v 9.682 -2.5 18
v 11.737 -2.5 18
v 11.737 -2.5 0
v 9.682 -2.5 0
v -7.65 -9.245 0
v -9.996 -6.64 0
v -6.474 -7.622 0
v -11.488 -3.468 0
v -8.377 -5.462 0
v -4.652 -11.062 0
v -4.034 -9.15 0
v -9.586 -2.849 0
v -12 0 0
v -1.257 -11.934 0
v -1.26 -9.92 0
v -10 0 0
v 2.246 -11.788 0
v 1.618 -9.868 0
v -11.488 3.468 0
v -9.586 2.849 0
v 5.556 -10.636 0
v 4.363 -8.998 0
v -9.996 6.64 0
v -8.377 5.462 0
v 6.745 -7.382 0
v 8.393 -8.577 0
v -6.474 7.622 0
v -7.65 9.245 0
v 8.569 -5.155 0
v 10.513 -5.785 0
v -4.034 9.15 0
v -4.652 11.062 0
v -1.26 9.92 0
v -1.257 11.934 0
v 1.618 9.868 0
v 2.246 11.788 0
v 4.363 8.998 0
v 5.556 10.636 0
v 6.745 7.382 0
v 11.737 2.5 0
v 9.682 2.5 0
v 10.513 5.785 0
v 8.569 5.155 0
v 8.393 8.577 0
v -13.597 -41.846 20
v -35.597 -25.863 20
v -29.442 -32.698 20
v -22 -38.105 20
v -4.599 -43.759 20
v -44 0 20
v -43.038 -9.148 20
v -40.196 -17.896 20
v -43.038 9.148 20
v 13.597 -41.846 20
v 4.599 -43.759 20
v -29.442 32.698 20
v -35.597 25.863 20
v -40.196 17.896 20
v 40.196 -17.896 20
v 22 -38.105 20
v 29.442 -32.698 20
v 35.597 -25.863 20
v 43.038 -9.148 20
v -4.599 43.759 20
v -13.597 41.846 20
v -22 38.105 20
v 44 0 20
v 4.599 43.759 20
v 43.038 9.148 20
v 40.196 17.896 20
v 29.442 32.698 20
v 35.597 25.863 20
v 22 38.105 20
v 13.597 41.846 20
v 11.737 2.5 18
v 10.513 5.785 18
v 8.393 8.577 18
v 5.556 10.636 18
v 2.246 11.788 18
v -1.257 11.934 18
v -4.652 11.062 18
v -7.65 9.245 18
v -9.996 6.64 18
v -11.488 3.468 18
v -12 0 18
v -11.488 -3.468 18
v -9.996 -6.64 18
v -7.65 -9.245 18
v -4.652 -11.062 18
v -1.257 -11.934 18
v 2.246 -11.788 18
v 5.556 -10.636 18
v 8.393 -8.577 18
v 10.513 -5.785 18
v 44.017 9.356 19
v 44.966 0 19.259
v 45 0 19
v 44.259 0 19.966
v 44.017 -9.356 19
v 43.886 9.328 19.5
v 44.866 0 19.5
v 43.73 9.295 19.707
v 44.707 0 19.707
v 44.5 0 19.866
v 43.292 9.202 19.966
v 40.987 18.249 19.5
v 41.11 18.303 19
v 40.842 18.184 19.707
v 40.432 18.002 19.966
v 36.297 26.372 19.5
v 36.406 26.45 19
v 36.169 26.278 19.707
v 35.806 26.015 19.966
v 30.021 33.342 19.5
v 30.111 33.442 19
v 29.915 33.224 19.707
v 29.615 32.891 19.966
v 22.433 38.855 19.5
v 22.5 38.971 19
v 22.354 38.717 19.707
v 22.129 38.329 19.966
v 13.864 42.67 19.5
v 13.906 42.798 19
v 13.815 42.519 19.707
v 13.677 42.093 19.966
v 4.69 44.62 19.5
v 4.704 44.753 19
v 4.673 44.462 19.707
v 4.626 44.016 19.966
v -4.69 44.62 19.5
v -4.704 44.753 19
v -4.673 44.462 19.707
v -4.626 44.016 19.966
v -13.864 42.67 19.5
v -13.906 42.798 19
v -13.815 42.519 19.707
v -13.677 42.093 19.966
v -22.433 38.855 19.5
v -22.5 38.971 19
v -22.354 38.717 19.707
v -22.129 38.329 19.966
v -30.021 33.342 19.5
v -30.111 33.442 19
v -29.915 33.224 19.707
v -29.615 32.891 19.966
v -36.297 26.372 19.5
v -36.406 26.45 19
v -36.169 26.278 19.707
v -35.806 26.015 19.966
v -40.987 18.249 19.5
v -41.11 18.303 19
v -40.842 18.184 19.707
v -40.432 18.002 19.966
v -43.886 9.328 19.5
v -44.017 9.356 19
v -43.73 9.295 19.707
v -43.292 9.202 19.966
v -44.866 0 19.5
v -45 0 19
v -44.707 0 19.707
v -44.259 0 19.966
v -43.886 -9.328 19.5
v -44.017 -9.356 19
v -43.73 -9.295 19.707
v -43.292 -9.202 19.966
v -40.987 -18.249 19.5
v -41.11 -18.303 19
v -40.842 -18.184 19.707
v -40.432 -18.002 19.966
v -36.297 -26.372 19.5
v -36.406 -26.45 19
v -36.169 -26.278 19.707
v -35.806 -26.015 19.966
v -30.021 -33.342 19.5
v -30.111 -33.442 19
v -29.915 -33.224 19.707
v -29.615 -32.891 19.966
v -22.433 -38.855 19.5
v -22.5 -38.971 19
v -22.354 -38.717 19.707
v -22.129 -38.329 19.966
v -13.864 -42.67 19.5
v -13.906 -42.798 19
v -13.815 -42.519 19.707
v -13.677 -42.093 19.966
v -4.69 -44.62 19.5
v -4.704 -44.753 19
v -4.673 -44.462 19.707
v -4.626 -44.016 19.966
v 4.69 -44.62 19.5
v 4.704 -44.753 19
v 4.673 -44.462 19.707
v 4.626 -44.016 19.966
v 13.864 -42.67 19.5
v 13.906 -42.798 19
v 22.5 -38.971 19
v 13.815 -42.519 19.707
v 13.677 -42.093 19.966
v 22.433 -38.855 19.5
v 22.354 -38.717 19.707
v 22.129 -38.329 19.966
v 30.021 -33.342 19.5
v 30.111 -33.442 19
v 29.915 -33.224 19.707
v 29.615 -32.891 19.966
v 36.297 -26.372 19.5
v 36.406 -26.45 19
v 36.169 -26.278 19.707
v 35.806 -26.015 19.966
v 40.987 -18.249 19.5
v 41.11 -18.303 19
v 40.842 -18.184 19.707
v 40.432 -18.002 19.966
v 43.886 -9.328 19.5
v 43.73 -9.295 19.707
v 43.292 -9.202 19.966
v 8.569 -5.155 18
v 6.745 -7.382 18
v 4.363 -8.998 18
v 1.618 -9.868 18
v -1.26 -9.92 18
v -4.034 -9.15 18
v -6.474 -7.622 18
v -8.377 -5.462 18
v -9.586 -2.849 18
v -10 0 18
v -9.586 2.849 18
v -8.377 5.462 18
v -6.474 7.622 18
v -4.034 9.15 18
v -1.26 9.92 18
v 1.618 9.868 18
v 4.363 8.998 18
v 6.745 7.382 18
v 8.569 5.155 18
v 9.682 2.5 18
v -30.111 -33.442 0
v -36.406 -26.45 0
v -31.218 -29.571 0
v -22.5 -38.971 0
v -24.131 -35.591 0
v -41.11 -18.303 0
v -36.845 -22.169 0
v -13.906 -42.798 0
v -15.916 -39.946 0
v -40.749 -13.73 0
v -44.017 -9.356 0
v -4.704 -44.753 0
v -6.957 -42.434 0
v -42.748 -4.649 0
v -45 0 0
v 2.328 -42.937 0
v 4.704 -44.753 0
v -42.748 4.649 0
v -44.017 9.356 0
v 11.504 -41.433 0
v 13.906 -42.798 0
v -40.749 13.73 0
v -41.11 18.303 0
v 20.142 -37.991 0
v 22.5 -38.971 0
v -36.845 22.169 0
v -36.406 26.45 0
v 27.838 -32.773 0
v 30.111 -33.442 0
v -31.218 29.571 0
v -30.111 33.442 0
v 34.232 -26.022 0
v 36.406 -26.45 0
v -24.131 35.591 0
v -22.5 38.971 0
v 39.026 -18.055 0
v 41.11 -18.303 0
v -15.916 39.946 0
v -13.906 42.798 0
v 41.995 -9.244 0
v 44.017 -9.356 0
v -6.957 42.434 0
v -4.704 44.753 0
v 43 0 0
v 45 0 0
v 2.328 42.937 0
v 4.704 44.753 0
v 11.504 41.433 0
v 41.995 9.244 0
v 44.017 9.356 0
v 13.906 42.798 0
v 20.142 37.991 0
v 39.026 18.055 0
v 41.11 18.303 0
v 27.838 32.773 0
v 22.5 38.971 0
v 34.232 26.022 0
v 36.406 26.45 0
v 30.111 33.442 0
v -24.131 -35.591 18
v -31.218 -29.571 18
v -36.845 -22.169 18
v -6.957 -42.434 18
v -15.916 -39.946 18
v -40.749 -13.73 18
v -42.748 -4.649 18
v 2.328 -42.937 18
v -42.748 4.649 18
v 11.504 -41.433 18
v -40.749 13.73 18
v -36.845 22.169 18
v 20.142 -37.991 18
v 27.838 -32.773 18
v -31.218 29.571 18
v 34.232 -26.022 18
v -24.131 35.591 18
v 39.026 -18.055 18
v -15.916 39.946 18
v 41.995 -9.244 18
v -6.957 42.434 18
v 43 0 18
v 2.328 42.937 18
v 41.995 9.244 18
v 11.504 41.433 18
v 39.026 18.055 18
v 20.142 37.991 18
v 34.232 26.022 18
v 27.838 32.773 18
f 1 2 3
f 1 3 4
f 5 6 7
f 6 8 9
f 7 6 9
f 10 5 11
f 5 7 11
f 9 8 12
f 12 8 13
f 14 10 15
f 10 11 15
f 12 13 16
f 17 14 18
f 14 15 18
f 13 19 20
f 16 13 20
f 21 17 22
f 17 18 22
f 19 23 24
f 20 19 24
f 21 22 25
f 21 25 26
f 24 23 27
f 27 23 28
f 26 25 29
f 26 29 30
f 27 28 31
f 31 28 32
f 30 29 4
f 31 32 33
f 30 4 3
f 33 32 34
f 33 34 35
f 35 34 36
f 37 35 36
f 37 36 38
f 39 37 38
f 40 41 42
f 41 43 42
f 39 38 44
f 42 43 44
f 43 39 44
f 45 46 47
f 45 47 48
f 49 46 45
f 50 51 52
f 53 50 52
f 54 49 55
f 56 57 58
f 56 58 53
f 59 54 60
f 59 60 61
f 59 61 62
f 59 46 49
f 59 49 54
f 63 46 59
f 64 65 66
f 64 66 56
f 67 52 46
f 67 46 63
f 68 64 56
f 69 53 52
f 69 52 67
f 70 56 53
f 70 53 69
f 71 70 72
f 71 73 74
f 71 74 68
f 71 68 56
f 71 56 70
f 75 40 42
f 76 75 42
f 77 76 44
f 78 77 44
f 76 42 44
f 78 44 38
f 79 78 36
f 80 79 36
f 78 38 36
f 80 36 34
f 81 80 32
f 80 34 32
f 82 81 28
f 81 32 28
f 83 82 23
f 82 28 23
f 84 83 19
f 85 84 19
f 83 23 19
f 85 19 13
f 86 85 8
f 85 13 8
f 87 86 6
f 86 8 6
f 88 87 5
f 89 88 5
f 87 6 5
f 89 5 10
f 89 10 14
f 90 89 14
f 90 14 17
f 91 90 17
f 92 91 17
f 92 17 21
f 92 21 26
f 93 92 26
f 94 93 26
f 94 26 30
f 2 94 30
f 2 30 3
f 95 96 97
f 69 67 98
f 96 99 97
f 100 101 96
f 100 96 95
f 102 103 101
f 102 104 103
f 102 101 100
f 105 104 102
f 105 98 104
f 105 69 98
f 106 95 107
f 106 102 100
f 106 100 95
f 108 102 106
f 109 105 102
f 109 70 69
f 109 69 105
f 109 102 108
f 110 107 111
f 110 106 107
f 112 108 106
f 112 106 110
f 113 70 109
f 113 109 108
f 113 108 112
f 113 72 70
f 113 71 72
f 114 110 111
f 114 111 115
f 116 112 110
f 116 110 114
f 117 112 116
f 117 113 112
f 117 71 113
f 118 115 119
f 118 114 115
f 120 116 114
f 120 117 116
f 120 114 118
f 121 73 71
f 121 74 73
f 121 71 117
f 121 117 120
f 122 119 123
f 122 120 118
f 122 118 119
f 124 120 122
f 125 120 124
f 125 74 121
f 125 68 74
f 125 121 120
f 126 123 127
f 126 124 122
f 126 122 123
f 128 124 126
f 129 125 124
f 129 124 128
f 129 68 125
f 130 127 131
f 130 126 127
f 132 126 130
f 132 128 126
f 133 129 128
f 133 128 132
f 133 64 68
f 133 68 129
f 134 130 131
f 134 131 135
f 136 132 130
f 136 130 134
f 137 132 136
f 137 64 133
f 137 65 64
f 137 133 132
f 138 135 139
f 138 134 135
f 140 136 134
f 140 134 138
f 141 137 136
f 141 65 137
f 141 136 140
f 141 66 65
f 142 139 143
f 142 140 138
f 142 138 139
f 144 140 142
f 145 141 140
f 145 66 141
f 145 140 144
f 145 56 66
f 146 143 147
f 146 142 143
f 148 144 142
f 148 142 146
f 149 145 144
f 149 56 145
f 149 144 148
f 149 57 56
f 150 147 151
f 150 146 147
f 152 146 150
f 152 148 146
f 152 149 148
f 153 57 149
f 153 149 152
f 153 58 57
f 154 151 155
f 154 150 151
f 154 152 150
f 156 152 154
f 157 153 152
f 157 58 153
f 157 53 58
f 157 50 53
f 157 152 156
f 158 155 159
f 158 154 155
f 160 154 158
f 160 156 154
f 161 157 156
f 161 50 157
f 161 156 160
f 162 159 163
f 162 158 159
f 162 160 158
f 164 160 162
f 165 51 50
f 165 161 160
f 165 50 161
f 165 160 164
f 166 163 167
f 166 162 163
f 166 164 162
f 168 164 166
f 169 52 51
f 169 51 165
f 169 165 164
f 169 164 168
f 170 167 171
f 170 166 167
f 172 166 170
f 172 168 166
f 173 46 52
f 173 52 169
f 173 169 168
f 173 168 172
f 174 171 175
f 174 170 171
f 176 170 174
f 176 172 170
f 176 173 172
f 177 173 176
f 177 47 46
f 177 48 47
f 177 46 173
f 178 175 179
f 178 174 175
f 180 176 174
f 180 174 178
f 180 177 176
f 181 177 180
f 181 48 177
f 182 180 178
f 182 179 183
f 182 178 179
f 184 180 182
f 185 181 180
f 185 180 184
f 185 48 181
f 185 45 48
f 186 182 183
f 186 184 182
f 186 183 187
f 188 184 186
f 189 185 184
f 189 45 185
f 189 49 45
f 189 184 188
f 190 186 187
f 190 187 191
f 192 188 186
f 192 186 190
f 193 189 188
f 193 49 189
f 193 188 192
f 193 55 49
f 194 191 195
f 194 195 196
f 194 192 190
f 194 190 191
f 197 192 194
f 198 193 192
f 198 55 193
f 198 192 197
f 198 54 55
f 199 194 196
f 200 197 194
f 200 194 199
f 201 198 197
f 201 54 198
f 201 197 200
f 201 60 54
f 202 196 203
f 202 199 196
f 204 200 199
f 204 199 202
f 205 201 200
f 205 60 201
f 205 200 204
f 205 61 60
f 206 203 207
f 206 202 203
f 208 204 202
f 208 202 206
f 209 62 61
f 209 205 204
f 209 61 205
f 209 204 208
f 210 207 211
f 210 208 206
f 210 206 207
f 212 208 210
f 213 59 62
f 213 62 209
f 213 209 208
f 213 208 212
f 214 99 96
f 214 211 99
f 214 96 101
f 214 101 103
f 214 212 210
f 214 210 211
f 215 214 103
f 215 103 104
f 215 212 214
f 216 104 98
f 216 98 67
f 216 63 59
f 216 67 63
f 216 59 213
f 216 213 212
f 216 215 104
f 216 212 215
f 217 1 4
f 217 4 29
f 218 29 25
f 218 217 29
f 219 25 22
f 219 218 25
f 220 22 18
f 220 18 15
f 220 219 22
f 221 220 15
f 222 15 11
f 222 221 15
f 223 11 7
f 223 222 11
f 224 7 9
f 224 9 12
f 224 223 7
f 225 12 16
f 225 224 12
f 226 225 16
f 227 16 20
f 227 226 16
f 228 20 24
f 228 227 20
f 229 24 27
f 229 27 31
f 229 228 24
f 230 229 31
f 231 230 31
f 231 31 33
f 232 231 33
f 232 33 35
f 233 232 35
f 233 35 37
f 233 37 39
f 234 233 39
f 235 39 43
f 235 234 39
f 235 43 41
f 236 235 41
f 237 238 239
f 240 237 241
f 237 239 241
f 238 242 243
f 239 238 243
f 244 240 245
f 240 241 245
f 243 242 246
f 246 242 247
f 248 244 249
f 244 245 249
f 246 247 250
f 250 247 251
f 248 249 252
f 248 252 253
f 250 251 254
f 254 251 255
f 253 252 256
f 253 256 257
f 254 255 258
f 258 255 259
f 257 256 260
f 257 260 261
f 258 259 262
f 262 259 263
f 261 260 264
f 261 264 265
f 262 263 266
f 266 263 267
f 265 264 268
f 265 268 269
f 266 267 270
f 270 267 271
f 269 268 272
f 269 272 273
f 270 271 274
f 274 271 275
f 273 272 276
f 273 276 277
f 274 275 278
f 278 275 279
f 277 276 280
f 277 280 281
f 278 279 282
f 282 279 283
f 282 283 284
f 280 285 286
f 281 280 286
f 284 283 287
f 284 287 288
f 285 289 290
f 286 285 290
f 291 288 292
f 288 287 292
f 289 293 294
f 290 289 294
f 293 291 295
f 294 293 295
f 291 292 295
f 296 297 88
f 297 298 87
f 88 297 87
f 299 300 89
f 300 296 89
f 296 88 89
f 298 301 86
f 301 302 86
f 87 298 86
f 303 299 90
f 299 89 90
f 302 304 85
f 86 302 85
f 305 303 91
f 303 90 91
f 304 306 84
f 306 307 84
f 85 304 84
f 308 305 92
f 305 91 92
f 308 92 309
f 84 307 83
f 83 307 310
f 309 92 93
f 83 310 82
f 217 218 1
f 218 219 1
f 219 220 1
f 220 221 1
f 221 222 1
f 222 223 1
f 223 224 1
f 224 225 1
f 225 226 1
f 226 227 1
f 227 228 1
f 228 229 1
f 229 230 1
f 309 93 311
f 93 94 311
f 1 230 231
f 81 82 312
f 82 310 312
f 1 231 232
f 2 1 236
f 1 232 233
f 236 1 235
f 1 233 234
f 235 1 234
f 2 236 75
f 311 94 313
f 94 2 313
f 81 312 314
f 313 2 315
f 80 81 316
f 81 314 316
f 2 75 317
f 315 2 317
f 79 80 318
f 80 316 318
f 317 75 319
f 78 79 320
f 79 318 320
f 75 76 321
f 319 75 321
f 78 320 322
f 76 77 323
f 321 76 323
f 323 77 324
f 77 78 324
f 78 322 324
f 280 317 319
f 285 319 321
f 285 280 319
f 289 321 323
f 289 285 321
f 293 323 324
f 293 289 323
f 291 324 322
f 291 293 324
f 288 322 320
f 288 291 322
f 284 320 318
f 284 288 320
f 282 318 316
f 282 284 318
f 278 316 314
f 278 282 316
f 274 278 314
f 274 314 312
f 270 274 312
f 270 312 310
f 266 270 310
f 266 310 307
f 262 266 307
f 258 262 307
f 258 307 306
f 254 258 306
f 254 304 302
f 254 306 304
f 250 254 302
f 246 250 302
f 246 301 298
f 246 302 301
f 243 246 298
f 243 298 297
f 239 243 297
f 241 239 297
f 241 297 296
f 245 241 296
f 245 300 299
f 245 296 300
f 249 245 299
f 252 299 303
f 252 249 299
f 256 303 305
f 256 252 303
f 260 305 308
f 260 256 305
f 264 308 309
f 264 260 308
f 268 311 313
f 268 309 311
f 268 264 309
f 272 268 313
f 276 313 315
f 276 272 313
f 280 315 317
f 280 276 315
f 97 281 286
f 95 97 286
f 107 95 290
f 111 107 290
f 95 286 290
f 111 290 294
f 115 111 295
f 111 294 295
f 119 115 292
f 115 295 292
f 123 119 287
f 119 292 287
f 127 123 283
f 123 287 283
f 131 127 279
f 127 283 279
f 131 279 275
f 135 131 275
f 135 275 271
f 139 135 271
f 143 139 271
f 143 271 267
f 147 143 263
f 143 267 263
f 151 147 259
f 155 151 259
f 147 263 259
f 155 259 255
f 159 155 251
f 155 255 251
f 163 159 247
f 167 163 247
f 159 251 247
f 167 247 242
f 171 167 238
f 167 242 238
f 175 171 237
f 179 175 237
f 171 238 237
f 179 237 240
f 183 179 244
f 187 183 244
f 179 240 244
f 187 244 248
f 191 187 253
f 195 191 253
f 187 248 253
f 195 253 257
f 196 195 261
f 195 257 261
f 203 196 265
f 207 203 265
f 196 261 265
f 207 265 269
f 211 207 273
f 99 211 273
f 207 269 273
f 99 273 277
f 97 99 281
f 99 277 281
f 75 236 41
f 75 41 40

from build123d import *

# Parameters (mm, degrees)
F0_R     = 45
F1_DEPTH = 20
F2_T     = -2
F3_R     = 12
F4_DEPTH = 18
F5_T     = -2
F7_DEPTH = 18
F8_R     = 1


# Not quite as in the source:
# - a shell that OpenCascade refuses in one call is made with other operations: the cavity is built on its own and cut out


with BuildPart() as f1:
    # F0 (on Top) → F1 (new body)
    with BuildSketch(Plane.XY):
        Circle(F0_R)
    extrude(amount=F1_DEPTH)

    # F2
    f2_openings = [f1.faces().sort_by_distance(p)[0] for p in [
        (0, 0, 0),
    ]]
    offset(amount=F2_T, openings=f2_openings)

    # F3 (on Top) → F4 (join, through all)
    with BuildSketch(Plane.XY):
        Circle(F3_R)
    extrude(amount=F4_DEPTH)

    # F5: a shell. OpenCascade refuses it in one call, so the cavity is built on its own and cut out:
    # the body offset inwards by the wall thickness, plus a prism from it out through each open face.
    f5_core = offset(f1.part, amount=F5_T, kind=Kind.INTERSECTION, mode=Mode.PRIVATE)
    f5_exits = [f5_core.faces().sort_by_distance(p)[0] for p in [
        (0, 0, 2),
    ]]
    add(f5_core, mode=Mode.SUBTRACT)
    extrude(f5_exits, amount=-F5_T, mode=Mode.SUBTRACT)

    # F6 (on face) → F7 (cut, through all)
    with BuildSketch(Plane(origin=(0, 0, 0), x_dir=(1, 0, 0), z_dir=(0, 0, -1))):
        with BuildLine():
            ThreePointArc((10, 0), (9.9202969627, -1.2600429248), (9.6824583655, -2.5))
            Line((9.6824583655, -2.5), (11.7366945943, -2.5))
            ThreePointArc((11.7366945943, -2.5), (11.9339921052, -1.2569138531), (12, 0))
            ThreePointArc((12, 0), (11.9339921052, 1.2569138531), (11.7366945943, 2.5))
            Line((11.7366945943, 2.5), (9.6824583655, 2.5))
            ThreePointArc((9.6824583655, 2.5), (9.9202969627, 1.2600429248), (10, 0))
        make_face()
    extrude(amount=-F7_DEPTH, mode=Mode.SUBTRACT)

    # F8
    f8_edges = [f1.edges().sort_by_distance(p)[0] for p in [
        (-45, 0, 20),
    ]]
    fillet(f8_edges, radius=F8_R)


solid = f1.part
